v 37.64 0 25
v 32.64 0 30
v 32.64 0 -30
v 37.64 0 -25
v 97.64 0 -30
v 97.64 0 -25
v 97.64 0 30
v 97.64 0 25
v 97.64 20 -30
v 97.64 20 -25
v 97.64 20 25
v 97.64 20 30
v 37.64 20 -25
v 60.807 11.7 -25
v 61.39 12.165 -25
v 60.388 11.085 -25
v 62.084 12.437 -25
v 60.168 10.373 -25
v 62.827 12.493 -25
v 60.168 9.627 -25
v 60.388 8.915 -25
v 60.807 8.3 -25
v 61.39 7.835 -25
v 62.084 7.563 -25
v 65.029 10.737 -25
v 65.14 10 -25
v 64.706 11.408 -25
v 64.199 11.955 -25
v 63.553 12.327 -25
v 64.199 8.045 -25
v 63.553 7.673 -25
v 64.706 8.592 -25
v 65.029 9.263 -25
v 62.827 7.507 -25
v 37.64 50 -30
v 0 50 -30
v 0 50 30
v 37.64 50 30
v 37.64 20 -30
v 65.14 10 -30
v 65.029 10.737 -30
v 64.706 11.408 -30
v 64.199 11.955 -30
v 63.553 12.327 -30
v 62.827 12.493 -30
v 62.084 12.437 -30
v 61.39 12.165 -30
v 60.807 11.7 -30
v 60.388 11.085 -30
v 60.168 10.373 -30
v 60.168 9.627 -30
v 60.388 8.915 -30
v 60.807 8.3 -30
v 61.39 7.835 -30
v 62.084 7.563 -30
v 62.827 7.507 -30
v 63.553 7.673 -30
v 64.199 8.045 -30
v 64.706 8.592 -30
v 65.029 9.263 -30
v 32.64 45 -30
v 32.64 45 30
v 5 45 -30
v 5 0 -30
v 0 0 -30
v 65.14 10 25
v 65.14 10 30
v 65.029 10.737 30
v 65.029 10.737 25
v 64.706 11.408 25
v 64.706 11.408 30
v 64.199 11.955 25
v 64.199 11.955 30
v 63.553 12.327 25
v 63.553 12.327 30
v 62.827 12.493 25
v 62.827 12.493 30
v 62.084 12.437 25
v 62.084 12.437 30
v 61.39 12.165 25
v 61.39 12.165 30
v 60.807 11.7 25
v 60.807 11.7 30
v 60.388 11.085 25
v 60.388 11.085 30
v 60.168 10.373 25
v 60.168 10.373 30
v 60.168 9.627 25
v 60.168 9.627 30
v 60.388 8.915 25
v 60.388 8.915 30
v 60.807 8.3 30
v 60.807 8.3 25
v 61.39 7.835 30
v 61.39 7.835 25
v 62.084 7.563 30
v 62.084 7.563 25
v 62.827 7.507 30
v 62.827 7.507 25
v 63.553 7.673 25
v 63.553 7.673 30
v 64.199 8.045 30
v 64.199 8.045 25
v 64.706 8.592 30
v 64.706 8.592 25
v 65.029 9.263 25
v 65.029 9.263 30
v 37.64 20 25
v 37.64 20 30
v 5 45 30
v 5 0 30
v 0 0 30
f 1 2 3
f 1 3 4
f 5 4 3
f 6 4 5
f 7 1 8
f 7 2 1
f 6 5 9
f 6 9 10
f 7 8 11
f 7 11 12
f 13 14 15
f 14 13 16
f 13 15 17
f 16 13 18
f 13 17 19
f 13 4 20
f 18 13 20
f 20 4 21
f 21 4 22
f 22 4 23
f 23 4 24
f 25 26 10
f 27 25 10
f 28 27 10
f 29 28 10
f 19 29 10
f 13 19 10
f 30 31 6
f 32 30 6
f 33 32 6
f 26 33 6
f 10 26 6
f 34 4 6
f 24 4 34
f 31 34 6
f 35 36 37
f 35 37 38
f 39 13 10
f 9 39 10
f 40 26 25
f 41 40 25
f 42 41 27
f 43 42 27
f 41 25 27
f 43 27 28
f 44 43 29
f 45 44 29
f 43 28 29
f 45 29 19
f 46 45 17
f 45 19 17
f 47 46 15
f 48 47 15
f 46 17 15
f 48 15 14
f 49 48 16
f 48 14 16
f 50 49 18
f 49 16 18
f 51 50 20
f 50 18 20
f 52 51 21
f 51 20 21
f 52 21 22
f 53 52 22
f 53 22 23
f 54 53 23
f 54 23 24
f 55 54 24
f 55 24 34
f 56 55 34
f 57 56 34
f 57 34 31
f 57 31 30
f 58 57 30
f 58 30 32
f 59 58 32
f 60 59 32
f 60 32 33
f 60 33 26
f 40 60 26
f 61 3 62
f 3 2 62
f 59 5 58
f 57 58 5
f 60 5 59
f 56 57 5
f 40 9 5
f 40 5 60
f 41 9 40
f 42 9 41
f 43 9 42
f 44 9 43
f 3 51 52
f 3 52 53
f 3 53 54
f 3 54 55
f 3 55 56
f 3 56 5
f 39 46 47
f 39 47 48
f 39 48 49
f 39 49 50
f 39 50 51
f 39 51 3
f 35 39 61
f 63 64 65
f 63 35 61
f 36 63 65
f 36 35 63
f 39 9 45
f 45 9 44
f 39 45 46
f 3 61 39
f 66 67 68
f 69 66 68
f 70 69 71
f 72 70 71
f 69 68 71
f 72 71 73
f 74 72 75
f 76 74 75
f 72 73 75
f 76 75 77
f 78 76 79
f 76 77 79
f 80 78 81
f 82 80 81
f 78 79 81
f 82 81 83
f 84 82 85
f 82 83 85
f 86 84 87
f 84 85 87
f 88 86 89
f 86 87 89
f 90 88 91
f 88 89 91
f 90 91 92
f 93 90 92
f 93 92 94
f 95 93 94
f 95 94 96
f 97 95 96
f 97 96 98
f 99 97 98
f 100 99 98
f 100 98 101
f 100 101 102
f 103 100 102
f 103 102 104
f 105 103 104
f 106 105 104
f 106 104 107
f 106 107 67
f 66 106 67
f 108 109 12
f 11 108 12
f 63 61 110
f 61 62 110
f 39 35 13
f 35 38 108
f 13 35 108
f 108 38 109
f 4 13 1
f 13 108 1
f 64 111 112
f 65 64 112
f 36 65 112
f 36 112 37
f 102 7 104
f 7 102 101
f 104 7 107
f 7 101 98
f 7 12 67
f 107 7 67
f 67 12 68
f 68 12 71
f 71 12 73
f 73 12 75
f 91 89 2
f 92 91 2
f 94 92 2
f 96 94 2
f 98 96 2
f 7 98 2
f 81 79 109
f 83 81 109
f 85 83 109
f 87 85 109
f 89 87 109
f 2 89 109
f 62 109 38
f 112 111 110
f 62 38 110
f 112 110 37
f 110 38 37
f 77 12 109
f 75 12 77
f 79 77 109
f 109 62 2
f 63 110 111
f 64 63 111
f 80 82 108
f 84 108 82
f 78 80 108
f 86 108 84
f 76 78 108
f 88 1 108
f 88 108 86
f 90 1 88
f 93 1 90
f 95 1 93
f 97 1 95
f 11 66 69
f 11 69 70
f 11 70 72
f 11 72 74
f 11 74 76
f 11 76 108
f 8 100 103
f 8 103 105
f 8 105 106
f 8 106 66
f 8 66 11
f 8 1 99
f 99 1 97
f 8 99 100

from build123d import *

# Parameters (mm, degrees)
BOSS_EXTRUDE1_DEPTH = 30
SKETCH3_W           = 60
SKETCH3_H           = 5
BOSS_EXTRUDE2_DEPTH = 20
SKETCH4_R           = 2.5
CUT_EXTRUDE1_DEPTH  = 126.034273701


with BuildPart() as part:
    # Sketch1 → Boss-Extrude1 (new, symmetric)
    with BuildSketch(Plane.XY):
        Polygon((0, 0), (0, 50), (37.64, 50), (37.64, 0), (32.64, 0), (32.64, 45), (5, 45), (5, 0), align=None)
    extrude(amount=BOSS_EXTRUDE1_DEPTH, both=True)

    # Sketch3 → Boss-Extrude2 (add)
    with BuildSketch(Plane.XZ):
        with Locations((67.64, 27.5)):
            Rectangle(SKETCH3_W, SKETCH3_H)
        with Locations((67.64, -27.5)):
            Rectangle(SKETCH3_W, SKETCH3_H)
    extrude(amount=-BOSS_EXTRUDE2_DEPTH)

    # Sketch4 → Cut-Extrude1 (cut, through all)
    with BuildSketch(Plane.XY.offset(30)):
        with Locations((62.64, 10)):
            Circle(SKETCH4_R)
    extrude(amount=-CUT_EXTRUDE1_DEPTH, mode=Mode.SUBTRACT)


solid = part.part
